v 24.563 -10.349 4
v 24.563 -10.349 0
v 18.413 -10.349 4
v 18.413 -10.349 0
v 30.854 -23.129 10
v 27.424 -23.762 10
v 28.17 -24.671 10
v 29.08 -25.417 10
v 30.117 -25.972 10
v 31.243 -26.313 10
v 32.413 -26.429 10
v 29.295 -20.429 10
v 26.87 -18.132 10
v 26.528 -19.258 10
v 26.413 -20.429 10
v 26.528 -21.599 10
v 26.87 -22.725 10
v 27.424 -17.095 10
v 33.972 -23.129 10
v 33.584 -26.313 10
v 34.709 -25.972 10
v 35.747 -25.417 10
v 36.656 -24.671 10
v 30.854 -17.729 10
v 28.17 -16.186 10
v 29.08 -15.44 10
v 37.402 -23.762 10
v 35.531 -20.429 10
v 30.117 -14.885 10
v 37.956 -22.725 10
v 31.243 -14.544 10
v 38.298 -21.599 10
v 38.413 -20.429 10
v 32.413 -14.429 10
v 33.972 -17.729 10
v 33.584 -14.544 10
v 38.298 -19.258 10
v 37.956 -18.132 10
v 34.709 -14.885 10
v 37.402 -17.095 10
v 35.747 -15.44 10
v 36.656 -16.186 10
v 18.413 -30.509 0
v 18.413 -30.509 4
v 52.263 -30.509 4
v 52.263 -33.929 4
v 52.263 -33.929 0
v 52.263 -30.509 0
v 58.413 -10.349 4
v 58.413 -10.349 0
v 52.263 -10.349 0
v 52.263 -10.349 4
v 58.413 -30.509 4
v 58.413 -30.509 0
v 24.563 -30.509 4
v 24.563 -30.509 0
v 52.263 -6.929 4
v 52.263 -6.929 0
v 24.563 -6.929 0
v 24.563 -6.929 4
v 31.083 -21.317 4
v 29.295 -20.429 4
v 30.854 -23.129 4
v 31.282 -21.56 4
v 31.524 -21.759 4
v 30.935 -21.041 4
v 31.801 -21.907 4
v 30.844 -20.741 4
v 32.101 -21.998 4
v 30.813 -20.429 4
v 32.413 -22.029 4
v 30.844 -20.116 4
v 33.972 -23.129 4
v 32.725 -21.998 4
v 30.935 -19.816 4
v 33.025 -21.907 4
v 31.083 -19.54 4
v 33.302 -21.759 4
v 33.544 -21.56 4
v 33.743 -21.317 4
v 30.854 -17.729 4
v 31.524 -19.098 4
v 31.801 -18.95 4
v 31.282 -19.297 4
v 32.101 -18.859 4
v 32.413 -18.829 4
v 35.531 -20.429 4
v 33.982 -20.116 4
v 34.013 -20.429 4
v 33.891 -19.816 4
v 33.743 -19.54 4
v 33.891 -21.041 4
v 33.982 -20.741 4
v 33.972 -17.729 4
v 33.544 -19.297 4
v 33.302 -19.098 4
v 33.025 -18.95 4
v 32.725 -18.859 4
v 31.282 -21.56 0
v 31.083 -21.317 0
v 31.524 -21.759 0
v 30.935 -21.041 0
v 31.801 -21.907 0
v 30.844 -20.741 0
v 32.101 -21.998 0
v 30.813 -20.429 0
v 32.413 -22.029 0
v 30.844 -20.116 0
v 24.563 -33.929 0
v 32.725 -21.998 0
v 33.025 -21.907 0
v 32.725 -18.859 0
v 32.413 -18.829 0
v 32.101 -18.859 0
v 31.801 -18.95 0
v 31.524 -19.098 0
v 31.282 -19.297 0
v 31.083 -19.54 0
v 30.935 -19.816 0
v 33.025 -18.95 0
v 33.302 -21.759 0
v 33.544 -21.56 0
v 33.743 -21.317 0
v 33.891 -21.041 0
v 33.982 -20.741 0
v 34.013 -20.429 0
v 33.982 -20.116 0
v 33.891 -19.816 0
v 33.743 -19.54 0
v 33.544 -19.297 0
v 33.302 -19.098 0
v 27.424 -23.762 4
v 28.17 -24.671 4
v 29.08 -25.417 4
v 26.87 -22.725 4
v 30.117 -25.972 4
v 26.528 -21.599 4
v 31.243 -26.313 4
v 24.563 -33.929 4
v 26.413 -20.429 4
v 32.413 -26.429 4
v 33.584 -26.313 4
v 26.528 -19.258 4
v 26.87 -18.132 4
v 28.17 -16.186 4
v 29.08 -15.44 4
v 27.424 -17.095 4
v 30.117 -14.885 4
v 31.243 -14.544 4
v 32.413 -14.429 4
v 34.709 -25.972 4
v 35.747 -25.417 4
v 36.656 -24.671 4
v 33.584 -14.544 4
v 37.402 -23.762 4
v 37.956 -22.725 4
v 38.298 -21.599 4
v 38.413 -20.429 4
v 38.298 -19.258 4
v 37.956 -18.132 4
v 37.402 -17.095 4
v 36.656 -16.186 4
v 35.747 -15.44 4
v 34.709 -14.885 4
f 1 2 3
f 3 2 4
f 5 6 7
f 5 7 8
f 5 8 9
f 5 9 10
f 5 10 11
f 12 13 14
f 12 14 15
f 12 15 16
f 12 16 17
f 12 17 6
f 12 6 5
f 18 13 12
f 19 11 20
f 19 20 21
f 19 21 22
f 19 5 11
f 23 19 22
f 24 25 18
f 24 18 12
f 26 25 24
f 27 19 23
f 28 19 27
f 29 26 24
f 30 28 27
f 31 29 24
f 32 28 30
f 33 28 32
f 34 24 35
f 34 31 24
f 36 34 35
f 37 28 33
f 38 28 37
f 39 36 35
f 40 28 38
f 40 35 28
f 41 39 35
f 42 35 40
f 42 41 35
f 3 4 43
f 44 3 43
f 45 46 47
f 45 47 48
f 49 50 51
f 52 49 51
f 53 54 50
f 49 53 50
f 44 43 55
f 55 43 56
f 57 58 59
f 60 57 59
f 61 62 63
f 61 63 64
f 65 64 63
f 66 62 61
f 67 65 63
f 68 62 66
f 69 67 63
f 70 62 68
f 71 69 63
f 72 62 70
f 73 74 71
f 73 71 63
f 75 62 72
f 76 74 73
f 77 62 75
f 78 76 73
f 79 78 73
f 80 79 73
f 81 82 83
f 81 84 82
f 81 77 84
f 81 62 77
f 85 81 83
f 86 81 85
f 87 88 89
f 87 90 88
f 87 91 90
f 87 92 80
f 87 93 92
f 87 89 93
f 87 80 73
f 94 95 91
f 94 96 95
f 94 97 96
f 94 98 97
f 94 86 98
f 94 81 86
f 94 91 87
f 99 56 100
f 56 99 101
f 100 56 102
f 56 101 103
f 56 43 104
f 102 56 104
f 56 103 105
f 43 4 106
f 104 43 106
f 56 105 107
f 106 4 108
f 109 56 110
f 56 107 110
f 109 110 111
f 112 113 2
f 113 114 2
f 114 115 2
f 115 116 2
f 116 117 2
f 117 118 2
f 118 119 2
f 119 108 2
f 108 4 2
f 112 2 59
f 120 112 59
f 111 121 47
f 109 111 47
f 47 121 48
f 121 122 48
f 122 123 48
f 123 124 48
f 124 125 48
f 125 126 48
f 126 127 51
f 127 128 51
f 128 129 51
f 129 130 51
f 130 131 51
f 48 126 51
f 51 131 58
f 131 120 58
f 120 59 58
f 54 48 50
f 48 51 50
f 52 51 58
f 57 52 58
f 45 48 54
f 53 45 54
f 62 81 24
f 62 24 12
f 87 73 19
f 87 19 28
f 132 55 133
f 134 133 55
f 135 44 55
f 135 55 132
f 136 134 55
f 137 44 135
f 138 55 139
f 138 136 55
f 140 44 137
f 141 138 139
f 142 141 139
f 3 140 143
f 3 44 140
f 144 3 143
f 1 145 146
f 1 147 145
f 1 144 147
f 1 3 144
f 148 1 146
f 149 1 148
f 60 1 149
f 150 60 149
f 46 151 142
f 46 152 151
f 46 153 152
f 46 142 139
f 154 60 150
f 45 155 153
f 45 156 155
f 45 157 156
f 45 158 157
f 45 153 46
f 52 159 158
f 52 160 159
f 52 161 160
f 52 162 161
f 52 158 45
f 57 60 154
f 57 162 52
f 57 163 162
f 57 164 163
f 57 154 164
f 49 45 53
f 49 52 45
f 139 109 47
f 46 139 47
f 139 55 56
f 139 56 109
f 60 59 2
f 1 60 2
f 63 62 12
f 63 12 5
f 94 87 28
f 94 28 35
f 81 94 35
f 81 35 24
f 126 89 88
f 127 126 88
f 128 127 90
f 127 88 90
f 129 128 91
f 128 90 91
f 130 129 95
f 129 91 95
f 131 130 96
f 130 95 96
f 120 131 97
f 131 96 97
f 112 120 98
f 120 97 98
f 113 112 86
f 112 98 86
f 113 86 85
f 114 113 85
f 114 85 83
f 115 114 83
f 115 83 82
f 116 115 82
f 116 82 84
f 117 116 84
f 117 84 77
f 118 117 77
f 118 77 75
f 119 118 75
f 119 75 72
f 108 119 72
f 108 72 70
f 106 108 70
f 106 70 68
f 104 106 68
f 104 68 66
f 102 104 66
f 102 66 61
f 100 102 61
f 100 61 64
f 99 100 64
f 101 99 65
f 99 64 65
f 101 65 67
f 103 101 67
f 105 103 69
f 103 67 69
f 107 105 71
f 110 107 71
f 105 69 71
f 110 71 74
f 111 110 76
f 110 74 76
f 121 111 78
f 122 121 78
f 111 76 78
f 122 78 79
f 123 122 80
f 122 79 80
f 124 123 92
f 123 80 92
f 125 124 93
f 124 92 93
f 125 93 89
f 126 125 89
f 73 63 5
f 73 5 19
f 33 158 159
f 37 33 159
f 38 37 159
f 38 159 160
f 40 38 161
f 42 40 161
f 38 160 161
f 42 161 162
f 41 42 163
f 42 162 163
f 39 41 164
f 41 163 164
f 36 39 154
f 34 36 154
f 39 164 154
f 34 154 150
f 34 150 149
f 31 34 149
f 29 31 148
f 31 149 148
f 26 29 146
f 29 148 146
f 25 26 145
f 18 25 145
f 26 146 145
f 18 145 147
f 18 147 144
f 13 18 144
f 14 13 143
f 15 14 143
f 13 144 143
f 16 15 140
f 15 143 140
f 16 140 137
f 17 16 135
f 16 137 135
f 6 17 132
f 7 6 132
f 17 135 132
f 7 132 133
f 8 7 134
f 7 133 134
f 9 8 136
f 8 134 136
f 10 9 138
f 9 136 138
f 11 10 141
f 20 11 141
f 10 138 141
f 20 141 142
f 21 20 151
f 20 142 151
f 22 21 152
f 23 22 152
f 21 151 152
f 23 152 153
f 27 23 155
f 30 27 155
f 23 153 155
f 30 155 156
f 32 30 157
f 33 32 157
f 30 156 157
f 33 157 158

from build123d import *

# Parameters (mm, degrees)
EXTRUDE_1_DEPTH     = 4
SKETCH_2_R          = 1.6
CUT_EXTRUDE_1_DEPTH = 68.670041634
SKETCH_3_R          = 6
EXTRUDE_2_DEPTH     = 6


with BuildPart() as part:
    # 草图1 → 凸台-拉伸1 (new body)
    with BuildSketch(Plane.XY):
        Polygon((58.413097366, -10.348521791), (52.263097366, -10.348521791), (52.263097366, -6.928521791), (24.563097366, -6.928521791), (24.563097366, -10.348521791), (18.413097366, -10.348521791), (18.413097366, -30.508521791), (24.563097366, -30.508521791), (24.563097366, -33.928521791), (52.263097366, -33.928521791), (52.263097366, -30.508521791), (58.413097366, -30.508521791), align=None)
    extrude(amount=EXTRUDE_1_DEPTH)

    # 草图2 → 切除-拉伸1 (cut, through all)
    with BuildSketch(Plane.XY.offset(4)):
        with Locations((32.413097366, -20.428521791)):
            Circle(SKETCH_2_R)
    extrude(amount=-CUT_EXTRUDE_1_DEPTH, mode=Mode.SUBTRACT)

    # 草图3 → 凸台-拉伸2 (add)
    with BuildSketch(Plane.XY.offset(4)):
        with Locations((32.413097366, -20.428521791)):
            Circle(SKETCH_3_R)
        Polygon((33.971943092, -23.128521791), (35.530788819, -20.428521791), (33.971943092, -17.728521791), (30.854251639, -17.728521791), (29.295405912, -20.428521791), (30.854251639, -23.128521791), align=None, mode=Mode.SUBTRACT)
    extrude(amount=EXTRUDE_2_DEPTH)


solid = part.part
